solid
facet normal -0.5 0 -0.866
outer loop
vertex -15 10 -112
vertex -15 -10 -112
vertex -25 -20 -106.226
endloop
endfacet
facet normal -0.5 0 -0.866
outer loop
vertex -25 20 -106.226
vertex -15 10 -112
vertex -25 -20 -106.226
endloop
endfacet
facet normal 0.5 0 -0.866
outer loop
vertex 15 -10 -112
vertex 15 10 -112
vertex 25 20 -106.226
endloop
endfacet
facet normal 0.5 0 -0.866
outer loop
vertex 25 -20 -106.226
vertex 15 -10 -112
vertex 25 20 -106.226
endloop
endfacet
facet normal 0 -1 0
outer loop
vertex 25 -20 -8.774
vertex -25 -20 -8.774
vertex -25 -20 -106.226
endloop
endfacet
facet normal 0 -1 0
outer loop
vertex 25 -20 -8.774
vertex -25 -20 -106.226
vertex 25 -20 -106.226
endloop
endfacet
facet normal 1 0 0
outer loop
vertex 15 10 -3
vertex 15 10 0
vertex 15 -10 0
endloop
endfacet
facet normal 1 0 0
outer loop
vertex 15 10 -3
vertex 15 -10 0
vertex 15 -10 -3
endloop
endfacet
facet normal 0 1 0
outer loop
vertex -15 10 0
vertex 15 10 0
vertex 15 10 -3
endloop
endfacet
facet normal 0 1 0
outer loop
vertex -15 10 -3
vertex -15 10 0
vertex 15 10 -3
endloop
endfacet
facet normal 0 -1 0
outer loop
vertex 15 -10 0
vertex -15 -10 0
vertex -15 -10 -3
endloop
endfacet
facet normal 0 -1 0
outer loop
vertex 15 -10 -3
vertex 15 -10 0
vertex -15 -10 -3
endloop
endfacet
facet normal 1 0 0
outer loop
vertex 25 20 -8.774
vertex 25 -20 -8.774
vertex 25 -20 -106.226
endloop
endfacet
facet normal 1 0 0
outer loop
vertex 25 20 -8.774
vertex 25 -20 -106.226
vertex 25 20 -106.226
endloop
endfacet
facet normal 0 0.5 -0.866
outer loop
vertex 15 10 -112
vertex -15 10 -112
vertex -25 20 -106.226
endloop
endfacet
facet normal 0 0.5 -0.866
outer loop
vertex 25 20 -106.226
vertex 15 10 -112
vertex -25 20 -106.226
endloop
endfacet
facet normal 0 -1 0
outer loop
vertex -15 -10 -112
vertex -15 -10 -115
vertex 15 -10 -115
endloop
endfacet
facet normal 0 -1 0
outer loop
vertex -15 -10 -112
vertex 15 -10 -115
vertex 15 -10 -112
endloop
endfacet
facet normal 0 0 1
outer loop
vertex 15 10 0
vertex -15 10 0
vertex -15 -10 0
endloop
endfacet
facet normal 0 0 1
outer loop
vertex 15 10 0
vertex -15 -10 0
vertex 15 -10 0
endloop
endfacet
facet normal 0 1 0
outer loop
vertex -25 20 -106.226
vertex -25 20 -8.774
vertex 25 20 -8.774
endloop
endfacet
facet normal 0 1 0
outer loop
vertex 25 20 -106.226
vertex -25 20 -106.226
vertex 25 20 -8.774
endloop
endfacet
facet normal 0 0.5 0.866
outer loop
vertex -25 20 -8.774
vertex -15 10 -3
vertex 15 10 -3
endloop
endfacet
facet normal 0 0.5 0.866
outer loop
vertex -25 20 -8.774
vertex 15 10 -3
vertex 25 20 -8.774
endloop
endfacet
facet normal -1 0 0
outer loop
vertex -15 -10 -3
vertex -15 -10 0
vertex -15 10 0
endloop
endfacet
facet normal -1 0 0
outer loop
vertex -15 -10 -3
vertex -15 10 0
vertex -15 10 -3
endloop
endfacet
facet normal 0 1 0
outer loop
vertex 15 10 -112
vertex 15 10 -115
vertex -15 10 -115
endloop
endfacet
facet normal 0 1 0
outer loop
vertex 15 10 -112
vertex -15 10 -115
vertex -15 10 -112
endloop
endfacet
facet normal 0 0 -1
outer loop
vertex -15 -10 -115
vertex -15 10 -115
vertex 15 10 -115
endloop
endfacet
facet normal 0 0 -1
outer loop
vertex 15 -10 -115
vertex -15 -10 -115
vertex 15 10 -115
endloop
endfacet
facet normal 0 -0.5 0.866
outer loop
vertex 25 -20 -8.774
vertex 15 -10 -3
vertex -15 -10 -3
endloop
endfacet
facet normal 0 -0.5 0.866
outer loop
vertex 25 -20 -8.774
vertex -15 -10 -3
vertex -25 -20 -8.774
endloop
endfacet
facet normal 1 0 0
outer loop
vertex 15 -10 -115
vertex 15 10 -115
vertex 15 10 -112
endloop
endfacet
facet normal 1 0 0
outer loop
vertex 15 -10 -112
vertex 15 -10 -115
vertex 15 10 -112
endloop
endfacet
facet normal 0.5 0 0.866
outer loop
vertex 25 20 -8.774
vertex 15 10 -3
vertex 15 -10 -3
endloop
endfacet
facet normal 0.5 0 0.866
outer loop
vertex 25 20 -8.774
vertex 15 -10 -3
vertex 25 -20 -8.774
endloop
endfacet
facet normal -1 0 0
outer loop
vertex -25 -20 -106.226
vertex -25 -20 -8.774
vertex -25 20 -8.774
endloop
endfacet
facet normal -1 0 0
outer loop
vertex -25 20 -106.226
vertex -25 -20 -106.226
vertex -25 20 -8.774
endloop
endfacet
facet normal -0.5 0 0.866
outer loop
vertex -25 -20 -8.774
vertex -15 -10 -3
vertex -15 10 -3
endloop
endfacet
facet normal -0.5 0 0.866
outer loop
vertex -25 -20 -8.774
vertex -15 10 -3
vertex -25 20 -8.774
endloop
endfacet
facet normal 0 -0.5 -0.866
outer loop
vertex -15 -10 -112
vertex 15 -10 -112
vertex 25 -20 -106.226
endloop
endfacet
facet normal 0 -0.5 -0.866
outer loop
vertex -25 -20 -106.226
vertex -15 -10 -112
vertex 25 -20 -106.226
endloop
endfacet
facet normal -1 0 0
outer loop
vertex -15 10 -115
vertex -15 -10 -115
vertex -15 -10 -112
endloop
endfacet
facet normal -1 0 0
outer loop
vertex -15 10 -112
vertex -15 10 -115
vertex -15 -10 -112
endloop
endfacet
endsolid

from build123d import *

# Parameters (mm, degrees)
SKETCH1_W           = 50
SKETCH1_H           = 40
BOSS_EXTRUDE1_DEPTH = 115


with BuildPart() as part:
    # Sketch1 → Boss-Extrude1 (new body)
    with BuildSketch(Plane.XY):
        Rectangle(SKETCH1_W, SKETCH1_H)
    extrude(amount=-BOSS_EXTRUDE1_DEPTH)

    # Cut-Sweep1: sweep along a path in Sketch2
    with BuildLine(Plane.XY) as cut_sweep1_path:
        Line((-15, -10), (15, -10))
        Line((15, -10), (15, 10))
        Line((15, 10), (-15, 10))
        Line((-15, 10), (-15, -10))
    # Sketch3 → Cut-Sweep1 (sweep, cut)
    with BuildSketch(Plane(origin=(15, 10, 0), x_dir=(0, 0, -1), z_dir=(1, 0, 0))):
        Polygon((8.773502692, 10), (0, 10), (0, 0), (3, 0), align=None)
    cut_sweep1 = sweep(path=cut_sweep1_path.line, transition=Transition.RIGHT, mode=Mode.SUBTRACT)

    # Mirror1: Cut-Sweep1 across plane
    add(cut_sweep1.mirror(Plane.XY.offset(-57.5)), mode=Mode.SUBTRACT)


solid = part.part
